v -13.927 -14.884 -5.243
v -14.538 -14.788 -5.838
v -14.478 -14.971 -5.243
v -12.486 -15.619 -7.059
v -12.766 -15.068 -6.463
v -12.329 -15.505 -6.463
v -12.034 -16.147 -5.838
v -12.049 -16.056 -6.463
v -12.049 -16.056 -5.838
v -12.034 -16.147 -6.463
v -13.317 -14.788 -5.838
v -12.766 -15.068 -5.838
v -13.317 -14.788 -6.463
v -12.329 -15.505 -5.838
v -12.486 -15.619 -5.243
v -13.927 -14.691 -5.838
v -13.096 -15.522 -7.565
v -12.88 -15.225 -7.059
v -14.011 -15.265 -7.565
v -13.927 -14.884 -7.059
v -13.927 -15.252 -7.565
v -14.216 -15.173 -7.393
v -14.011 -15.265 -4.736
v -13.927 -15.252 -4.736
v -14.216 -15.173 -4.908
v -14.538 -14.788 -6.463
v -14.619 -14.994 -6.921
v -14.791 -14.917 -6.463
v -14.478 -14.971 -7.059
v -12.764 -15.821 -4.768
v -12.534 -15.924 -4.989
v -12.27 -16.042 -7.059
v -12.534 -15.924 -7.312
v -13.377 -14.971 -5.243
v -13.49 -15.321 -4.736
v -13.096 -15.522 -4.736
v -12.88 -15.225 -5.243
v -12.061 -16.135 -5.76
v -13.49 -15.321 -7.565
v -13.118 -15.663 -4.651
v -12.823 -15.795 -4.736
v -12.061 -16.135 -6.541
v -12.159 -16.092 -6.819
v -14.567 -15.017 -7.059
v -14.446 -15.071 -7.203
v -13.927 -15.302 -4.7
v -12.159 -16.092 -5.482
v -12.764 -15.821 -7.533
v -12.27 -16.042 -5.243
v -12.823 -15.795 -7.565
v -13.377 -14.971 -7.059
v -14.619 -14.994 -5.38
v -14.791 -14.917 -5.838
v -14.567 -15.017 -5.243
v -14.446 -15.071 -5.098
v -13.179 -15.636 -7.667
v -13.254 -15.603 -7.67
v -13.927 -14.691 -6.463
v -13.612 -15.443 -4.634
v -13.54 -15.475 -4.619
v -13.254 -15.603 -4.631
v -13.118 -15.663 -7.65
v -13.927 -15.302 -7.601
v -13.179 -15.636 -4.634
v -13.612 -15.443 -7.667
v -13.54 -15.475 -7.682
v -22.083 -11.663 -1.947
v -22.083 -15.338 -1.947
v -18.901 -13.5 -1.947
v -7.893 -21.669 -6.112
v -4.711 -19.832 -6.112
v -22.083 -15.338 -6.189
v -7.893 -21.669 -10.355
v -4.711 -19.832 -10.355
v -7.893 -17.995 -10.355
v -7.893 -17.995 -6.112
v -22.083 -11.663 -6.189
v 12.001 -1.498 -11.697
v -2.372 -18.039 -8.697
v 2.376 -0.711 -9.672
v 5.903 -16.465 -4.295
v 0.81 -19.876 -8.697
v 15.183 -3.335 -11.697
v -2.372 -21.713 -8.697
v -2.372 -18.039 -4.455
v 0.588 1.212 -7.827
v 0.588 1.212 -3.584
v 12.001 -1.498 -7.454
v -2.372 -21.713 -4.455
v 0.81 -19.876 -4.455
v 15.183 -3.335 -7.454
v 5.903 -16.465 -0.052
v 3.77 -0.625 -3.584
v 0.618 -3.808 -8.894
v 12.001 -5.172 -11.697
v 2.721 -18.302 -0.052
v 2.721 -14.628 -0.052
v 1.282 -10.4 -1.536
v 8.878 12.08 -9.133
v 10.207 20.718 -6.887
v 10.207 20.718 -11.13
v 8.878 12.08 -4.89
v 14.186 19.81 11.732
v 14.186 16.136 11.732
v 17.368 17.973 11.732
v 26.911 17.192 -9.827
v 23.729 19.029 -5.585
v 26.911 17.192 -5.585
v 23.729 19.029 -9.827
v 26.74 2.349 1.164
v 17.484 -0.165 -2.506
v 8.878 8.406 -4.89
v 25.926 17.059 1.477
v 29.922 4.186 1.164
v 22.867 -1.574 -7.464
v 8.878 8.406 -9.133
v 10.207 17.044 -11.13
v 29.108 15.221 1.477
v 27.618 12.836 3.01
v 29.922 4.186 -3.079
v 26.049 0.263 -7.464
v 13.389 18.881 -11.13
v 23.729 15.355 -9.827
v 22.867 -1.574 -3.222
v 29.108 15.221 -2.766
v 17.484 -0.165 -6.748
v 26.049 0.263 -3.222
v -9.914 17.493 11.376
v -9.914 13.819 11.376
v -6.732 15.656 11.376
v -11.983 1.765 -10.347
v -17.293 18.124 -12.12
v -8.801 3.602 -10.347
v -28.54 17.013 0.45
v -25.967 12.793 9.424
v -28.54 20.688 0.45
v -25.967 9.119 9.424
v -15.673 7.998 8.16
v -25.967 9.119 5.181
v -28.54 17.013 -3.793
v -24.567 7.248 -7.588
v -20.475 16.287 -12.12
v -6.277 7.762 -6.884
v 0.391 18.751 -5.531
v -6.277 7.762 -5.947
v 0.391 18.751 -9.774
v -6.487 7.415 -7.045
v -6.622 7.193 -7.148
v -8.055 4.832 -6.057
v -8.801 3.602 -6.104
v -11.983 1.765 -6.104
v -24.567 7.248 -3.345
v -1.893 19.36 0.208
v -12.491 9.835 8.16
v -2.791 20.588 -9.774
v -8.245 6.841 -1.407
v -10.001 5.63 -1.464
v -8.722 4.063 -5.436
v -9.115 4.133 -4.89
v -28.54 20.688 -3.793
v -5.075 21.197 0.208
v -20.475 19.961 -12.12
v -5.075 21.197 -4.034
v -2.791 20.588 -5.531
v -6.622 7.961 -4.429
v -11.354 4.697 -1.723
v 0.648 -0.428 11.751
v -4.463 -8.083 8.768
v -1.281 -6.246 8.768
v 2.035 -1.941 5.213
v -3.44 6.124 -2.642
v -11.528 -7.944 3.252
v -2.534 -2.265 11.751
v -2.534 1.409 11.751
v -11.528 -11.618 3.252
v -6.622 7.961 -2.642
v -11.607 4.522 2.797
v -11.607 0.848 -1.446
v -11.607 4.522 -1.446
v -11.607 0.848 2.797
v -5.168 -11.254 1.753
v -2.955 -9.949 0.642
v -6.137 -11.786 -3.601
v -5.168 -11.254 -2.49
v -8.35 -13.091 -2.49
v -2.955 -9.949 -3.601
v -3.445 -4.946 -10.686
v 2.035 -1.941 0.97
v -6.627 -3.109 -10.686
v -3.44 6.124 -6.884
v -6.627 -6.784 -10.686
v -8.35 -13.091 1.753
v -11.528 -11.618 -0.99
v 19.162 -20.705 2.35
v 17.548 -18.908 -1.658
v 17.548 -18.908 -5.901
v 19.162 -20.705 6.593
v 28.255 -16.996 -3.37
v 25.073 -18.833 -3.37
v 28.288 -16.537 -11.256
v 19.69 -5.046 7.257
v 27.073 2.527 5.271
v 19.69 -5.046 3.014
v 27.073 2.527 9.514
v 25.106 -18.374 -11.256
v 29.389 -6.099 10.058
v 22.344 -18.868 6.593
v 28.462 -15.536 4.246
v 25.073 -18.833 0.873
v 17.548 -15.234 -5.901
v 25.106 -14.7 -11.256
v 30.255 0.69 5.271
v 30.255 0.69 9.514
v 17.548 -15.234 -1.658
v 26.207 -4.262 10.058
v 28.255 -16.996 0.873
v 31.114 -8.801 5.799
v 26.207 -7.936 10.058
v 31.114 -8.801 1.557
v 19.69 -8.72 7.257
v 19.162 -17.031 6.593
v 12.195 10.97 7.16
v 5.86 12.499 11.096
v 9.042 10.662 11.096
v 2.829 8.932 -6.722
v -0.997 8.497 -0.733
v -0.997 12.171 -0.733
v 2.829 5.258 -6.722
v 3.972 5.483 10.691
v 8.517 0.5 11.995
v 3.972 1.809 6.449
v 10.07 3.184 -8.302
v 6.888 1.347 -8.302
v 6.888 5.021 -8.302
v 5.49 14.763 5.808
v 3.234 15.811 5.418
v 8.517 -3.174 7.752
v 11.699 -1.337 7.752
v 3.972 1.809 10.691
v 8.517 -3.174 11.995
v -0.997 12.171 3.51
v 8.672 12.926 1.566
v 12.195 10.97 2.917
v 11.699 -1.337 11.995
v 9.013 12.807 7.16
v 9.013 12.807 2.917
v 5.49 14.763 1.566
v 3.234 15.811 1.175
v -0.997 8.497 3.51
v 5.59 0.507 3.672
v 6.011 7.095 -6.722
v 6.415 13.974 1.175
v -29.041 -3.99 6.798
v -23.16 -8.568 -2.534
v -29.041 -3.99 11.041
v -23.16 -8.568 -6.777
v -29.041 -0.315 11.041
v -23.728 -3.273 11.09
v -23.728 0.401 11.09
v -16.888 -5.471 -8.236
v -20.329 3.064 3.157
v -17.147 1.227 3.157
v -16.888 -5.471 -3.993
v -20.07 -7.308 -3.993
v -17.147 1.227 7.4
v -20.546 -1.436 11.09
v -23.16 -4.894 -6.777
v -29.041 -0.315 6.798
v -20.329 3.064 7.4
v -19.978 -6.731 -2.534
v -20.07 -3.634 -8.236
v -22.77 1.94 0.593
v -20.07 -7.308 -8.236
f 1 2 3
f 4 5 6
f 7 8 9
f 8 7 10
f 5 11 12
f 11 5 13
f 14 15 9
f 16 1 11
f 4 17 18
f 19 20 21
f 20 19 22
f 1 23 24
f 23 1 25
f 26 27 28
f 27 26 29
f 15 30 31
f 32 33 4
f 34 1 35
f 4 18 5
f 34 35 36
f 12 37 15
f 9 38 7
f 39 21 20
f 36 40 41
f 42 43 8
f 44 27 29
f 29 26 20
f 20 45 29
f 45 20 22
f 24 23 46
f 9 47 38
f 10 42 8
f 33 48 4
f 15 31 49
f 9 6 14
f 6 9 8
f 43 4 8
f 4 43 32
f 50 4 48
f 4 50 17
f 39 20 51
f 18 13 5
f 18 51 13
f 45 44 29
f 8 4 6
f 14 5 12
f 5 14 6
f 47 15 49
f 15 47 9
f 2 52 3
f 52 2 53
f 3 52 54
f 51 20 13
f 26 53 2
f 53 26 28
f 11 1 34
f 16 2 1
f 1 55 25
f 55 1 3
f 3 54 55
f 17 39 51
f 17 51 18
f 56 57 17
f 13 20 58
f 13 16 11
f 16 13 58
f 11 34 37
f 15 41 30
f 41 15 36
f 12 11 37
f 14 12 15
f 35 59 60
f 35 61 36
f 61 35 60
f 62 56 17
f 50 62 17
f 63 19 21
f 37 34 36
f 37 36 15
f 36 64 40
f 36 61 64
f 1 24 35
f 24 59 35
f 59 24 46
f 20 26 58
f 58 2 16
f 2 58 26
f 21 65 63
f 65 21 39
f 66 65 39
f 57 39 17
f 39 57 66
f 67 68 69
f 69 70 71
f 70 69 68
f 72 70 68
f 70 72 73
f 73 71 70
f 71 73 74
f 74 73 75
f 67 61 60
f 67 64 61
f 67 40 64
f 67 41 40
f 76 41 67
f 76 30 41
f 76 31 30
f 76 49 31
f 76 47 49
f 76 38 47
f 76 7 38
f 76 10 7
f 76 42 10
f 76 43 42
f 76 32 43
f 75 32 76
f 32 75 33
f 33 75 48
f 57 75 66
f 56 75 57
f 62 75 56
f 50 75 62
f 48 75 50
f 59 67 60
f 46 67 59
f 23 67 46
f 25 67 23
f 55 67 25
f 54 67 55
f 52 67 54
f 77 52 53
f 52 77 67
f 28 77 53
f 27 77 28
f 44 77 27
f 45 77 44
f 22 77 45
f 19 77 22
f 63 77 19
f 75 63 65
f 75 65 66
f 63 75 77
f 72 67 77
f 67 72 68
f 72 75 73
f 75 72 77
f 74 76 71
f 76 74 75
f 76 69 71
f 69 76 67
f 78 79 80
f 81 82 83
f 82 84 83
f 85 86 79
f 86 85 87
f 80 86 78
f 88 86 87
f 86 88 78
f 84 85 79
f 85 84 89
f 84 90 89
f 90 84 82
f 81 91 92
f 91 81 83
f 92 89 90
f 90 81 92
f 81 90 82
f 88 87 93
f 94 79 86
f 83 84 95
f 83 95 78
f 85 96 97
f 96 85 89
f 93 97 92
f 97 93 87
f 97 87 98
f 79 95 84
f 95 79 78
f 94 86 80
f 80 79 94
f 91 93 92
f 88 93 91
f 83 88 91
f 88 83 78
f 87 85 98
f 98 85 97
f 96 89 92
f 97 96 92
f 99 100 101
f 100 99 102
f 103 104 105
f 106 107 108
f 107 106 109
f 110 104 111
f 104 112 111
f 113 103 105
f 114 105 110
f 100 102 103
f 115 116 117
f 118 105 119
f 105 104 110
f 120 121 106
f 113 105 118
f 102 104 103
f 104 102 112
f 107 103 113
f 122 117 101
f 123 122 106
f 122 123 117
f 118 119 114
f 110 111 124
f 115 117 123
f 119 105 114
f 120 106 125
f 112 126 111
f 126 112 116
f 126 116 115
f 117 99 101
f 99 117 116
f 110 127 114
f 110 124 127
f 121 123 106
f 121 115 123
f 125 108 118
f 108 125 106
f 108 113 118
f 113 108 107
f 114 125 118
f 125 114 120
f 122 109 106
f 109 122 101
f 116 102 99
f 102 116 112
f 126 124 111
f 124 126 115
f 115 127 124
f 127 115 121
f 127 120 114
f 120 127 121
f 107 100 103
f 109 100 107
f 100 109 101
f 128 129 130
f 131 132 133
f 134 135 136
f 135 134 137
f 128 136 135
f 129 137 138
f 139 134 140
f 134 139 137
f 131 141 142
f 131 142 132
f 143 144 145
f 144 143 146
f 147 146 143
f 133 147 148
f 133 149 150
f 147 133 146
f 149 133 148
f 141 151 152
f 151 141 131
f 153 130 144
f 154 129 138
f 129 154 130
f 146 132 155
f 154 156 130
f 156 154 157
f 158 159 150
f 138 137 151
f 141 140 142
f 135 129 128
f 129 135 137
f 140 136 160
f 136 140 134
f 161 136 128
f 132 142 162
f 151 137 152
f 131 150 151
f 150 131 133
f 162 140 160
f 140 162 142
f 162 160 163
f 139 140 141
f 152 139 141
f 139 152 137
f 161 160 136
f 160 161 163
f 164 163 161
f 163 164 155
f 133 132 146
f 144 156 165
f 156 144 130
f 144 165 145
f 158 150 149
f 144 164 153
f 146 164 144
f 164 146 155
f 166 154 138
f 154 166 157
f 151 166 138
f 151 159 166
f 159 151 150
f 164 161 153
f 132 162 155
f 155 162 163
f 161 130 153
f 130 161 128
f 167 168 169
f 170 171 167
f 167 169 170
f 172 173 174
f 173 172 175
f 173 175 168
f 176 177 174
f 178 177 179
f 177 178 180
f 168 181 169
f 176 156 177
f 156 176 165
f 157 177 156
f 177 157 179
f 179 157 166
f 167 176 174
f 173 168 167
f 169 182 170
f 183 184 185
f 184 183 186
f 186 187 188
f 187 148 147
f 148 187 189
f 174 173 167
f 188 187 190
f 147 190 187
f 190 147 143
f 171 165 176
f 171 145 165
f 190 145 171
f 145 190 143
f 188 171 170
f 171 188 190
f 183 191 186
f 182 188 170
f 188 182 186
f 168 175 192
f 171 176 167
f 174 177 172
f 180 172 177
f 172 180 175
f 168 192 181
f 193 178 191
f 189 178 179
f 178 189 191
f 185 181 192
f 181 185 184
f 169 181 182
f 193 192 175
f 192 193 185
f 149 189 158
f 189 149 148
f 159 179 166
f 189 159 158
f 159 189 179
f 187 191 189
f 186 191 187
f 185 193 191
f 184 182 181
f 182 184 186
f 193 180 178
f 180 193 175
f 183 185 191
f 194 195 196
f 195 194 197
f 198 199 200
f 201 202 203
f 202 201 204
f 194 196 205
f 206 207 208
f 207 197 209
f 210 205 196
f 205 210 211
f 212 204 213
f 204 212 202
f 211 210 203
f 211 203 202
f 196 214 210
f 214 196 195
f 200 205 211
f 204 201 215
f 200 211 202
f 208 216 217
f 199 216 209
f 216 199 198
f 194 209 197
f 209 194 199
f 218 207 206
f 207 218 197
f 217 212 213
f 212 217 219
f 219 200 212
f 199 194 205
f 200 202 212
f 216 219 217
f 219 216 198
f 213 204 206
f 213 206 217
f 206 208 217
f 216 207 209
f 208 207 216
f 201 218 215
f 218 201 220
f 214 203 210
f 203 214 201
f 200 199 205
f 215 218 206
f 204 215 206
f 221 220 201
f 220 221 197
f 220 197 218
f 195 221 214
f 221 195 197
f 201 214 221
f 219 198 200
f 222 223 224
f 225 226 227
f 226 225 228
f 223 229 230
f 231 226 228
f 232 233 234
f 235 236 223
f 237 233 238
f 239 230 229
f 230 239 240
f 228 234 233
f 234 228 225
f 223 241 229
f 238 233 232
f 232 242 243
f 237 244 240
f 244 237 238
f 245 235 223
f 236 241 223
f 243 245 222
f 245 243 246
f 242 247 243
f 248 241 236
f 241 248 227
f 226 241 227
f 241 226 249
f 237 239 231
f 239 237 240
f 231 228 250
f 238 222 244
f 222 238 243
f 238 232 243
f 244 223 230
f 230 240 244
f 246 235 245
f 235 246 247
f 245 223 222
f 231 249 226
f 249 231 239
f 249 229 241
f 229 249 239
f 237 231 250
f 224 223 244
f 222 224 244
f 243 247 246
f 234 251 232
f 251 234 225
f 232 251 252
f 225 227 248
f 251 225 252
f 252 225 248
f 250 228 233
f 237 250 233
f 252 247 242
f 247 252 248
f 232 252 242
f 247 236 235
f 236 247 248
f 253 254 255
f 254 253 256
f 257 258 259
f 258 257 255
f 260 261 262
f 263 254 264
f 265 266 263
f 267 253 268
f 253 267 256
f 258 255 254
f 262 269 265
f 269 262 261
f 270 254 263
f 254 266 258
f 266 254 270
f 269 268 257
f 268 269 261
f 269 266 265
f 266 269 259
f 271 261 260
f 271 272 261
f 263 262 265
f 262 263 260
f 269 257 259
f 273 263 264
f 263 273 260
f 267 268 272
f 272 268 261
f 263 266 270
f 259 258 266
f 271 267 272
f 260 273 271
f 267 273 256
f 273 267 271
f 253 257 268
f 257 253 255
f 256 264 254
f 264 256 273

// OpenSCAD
p=make_points(75);
K=Kmeans(p,round(rnd(1,20)),round(rnd(1,10)));
for(i=[0:len(p)-1])translate(p[i])sphere(0.5);  
for(i=[0: max(0,len(K[0])-1)])
    translate(K[0][i])color("Red",0.5)sphere(2,$fn=20);
for(i=[0: max(0,len(K[1])-1)]){
    color([rnd(),rnd(),rnd()] ,0.5)hull(){
    for(j=[0: max(0,len(K[1][i])-1)])translate(K[1][i][j])sphere( 3,$fn=1 );}}

function Kmeans(v,K,c=5,inmeans=undef) =  len(v) < K ? [v,v] :
let(
maxlenv= max(0,len(v)-1),maxK=max(0,K-1),
means=inmeans==undef? /* Initailize means if not done */    [for(i=[0:maxlenv])
        (v[rnd(maxlenv)]+v[rnd(maxlenv)]+v[rnd(maxlenv)])/3]:inmeans, 
vbuckets=[for(i=[0:maxlenv])index_min([for(k=[0:maxK])norm(v[i]-means[k])])],
new_means=[for(k=[0:maxK]) mean([for(i=[0:maxlenv]) if(vbuckets[i]==k)v[i]])]   )
c>0? Kmeans(v,K,c-1,new_means):
let(inbuckets=[for(k=[0:maxK])[for(i=[0:maxlenv]) if(vbuckets[i]==k)v[i]] ])
[new_means,inbuckets] ;


function index_min(l) = search(min(l), l)[0];
function index_max(l) = search(max(l), l)[0];
function mean(a) = !(len(a) > 0) ?  undef :   ([ for(b=a) 1 ] * a )/len(a);
function make_points(j=10)= ([for(i=[0:j])[rnd(-30,30),rnd(-20,20),rnd(-10,10)]]);
function rnd(a = 1, b = 0, s = [] ) = 
  s == [] ? 
   (rands(min(a, b), max(   a, b), 1)[0]) 
  : 
   (rands(min(a, b), max(a, b), 1, s)[0])
  ; 
